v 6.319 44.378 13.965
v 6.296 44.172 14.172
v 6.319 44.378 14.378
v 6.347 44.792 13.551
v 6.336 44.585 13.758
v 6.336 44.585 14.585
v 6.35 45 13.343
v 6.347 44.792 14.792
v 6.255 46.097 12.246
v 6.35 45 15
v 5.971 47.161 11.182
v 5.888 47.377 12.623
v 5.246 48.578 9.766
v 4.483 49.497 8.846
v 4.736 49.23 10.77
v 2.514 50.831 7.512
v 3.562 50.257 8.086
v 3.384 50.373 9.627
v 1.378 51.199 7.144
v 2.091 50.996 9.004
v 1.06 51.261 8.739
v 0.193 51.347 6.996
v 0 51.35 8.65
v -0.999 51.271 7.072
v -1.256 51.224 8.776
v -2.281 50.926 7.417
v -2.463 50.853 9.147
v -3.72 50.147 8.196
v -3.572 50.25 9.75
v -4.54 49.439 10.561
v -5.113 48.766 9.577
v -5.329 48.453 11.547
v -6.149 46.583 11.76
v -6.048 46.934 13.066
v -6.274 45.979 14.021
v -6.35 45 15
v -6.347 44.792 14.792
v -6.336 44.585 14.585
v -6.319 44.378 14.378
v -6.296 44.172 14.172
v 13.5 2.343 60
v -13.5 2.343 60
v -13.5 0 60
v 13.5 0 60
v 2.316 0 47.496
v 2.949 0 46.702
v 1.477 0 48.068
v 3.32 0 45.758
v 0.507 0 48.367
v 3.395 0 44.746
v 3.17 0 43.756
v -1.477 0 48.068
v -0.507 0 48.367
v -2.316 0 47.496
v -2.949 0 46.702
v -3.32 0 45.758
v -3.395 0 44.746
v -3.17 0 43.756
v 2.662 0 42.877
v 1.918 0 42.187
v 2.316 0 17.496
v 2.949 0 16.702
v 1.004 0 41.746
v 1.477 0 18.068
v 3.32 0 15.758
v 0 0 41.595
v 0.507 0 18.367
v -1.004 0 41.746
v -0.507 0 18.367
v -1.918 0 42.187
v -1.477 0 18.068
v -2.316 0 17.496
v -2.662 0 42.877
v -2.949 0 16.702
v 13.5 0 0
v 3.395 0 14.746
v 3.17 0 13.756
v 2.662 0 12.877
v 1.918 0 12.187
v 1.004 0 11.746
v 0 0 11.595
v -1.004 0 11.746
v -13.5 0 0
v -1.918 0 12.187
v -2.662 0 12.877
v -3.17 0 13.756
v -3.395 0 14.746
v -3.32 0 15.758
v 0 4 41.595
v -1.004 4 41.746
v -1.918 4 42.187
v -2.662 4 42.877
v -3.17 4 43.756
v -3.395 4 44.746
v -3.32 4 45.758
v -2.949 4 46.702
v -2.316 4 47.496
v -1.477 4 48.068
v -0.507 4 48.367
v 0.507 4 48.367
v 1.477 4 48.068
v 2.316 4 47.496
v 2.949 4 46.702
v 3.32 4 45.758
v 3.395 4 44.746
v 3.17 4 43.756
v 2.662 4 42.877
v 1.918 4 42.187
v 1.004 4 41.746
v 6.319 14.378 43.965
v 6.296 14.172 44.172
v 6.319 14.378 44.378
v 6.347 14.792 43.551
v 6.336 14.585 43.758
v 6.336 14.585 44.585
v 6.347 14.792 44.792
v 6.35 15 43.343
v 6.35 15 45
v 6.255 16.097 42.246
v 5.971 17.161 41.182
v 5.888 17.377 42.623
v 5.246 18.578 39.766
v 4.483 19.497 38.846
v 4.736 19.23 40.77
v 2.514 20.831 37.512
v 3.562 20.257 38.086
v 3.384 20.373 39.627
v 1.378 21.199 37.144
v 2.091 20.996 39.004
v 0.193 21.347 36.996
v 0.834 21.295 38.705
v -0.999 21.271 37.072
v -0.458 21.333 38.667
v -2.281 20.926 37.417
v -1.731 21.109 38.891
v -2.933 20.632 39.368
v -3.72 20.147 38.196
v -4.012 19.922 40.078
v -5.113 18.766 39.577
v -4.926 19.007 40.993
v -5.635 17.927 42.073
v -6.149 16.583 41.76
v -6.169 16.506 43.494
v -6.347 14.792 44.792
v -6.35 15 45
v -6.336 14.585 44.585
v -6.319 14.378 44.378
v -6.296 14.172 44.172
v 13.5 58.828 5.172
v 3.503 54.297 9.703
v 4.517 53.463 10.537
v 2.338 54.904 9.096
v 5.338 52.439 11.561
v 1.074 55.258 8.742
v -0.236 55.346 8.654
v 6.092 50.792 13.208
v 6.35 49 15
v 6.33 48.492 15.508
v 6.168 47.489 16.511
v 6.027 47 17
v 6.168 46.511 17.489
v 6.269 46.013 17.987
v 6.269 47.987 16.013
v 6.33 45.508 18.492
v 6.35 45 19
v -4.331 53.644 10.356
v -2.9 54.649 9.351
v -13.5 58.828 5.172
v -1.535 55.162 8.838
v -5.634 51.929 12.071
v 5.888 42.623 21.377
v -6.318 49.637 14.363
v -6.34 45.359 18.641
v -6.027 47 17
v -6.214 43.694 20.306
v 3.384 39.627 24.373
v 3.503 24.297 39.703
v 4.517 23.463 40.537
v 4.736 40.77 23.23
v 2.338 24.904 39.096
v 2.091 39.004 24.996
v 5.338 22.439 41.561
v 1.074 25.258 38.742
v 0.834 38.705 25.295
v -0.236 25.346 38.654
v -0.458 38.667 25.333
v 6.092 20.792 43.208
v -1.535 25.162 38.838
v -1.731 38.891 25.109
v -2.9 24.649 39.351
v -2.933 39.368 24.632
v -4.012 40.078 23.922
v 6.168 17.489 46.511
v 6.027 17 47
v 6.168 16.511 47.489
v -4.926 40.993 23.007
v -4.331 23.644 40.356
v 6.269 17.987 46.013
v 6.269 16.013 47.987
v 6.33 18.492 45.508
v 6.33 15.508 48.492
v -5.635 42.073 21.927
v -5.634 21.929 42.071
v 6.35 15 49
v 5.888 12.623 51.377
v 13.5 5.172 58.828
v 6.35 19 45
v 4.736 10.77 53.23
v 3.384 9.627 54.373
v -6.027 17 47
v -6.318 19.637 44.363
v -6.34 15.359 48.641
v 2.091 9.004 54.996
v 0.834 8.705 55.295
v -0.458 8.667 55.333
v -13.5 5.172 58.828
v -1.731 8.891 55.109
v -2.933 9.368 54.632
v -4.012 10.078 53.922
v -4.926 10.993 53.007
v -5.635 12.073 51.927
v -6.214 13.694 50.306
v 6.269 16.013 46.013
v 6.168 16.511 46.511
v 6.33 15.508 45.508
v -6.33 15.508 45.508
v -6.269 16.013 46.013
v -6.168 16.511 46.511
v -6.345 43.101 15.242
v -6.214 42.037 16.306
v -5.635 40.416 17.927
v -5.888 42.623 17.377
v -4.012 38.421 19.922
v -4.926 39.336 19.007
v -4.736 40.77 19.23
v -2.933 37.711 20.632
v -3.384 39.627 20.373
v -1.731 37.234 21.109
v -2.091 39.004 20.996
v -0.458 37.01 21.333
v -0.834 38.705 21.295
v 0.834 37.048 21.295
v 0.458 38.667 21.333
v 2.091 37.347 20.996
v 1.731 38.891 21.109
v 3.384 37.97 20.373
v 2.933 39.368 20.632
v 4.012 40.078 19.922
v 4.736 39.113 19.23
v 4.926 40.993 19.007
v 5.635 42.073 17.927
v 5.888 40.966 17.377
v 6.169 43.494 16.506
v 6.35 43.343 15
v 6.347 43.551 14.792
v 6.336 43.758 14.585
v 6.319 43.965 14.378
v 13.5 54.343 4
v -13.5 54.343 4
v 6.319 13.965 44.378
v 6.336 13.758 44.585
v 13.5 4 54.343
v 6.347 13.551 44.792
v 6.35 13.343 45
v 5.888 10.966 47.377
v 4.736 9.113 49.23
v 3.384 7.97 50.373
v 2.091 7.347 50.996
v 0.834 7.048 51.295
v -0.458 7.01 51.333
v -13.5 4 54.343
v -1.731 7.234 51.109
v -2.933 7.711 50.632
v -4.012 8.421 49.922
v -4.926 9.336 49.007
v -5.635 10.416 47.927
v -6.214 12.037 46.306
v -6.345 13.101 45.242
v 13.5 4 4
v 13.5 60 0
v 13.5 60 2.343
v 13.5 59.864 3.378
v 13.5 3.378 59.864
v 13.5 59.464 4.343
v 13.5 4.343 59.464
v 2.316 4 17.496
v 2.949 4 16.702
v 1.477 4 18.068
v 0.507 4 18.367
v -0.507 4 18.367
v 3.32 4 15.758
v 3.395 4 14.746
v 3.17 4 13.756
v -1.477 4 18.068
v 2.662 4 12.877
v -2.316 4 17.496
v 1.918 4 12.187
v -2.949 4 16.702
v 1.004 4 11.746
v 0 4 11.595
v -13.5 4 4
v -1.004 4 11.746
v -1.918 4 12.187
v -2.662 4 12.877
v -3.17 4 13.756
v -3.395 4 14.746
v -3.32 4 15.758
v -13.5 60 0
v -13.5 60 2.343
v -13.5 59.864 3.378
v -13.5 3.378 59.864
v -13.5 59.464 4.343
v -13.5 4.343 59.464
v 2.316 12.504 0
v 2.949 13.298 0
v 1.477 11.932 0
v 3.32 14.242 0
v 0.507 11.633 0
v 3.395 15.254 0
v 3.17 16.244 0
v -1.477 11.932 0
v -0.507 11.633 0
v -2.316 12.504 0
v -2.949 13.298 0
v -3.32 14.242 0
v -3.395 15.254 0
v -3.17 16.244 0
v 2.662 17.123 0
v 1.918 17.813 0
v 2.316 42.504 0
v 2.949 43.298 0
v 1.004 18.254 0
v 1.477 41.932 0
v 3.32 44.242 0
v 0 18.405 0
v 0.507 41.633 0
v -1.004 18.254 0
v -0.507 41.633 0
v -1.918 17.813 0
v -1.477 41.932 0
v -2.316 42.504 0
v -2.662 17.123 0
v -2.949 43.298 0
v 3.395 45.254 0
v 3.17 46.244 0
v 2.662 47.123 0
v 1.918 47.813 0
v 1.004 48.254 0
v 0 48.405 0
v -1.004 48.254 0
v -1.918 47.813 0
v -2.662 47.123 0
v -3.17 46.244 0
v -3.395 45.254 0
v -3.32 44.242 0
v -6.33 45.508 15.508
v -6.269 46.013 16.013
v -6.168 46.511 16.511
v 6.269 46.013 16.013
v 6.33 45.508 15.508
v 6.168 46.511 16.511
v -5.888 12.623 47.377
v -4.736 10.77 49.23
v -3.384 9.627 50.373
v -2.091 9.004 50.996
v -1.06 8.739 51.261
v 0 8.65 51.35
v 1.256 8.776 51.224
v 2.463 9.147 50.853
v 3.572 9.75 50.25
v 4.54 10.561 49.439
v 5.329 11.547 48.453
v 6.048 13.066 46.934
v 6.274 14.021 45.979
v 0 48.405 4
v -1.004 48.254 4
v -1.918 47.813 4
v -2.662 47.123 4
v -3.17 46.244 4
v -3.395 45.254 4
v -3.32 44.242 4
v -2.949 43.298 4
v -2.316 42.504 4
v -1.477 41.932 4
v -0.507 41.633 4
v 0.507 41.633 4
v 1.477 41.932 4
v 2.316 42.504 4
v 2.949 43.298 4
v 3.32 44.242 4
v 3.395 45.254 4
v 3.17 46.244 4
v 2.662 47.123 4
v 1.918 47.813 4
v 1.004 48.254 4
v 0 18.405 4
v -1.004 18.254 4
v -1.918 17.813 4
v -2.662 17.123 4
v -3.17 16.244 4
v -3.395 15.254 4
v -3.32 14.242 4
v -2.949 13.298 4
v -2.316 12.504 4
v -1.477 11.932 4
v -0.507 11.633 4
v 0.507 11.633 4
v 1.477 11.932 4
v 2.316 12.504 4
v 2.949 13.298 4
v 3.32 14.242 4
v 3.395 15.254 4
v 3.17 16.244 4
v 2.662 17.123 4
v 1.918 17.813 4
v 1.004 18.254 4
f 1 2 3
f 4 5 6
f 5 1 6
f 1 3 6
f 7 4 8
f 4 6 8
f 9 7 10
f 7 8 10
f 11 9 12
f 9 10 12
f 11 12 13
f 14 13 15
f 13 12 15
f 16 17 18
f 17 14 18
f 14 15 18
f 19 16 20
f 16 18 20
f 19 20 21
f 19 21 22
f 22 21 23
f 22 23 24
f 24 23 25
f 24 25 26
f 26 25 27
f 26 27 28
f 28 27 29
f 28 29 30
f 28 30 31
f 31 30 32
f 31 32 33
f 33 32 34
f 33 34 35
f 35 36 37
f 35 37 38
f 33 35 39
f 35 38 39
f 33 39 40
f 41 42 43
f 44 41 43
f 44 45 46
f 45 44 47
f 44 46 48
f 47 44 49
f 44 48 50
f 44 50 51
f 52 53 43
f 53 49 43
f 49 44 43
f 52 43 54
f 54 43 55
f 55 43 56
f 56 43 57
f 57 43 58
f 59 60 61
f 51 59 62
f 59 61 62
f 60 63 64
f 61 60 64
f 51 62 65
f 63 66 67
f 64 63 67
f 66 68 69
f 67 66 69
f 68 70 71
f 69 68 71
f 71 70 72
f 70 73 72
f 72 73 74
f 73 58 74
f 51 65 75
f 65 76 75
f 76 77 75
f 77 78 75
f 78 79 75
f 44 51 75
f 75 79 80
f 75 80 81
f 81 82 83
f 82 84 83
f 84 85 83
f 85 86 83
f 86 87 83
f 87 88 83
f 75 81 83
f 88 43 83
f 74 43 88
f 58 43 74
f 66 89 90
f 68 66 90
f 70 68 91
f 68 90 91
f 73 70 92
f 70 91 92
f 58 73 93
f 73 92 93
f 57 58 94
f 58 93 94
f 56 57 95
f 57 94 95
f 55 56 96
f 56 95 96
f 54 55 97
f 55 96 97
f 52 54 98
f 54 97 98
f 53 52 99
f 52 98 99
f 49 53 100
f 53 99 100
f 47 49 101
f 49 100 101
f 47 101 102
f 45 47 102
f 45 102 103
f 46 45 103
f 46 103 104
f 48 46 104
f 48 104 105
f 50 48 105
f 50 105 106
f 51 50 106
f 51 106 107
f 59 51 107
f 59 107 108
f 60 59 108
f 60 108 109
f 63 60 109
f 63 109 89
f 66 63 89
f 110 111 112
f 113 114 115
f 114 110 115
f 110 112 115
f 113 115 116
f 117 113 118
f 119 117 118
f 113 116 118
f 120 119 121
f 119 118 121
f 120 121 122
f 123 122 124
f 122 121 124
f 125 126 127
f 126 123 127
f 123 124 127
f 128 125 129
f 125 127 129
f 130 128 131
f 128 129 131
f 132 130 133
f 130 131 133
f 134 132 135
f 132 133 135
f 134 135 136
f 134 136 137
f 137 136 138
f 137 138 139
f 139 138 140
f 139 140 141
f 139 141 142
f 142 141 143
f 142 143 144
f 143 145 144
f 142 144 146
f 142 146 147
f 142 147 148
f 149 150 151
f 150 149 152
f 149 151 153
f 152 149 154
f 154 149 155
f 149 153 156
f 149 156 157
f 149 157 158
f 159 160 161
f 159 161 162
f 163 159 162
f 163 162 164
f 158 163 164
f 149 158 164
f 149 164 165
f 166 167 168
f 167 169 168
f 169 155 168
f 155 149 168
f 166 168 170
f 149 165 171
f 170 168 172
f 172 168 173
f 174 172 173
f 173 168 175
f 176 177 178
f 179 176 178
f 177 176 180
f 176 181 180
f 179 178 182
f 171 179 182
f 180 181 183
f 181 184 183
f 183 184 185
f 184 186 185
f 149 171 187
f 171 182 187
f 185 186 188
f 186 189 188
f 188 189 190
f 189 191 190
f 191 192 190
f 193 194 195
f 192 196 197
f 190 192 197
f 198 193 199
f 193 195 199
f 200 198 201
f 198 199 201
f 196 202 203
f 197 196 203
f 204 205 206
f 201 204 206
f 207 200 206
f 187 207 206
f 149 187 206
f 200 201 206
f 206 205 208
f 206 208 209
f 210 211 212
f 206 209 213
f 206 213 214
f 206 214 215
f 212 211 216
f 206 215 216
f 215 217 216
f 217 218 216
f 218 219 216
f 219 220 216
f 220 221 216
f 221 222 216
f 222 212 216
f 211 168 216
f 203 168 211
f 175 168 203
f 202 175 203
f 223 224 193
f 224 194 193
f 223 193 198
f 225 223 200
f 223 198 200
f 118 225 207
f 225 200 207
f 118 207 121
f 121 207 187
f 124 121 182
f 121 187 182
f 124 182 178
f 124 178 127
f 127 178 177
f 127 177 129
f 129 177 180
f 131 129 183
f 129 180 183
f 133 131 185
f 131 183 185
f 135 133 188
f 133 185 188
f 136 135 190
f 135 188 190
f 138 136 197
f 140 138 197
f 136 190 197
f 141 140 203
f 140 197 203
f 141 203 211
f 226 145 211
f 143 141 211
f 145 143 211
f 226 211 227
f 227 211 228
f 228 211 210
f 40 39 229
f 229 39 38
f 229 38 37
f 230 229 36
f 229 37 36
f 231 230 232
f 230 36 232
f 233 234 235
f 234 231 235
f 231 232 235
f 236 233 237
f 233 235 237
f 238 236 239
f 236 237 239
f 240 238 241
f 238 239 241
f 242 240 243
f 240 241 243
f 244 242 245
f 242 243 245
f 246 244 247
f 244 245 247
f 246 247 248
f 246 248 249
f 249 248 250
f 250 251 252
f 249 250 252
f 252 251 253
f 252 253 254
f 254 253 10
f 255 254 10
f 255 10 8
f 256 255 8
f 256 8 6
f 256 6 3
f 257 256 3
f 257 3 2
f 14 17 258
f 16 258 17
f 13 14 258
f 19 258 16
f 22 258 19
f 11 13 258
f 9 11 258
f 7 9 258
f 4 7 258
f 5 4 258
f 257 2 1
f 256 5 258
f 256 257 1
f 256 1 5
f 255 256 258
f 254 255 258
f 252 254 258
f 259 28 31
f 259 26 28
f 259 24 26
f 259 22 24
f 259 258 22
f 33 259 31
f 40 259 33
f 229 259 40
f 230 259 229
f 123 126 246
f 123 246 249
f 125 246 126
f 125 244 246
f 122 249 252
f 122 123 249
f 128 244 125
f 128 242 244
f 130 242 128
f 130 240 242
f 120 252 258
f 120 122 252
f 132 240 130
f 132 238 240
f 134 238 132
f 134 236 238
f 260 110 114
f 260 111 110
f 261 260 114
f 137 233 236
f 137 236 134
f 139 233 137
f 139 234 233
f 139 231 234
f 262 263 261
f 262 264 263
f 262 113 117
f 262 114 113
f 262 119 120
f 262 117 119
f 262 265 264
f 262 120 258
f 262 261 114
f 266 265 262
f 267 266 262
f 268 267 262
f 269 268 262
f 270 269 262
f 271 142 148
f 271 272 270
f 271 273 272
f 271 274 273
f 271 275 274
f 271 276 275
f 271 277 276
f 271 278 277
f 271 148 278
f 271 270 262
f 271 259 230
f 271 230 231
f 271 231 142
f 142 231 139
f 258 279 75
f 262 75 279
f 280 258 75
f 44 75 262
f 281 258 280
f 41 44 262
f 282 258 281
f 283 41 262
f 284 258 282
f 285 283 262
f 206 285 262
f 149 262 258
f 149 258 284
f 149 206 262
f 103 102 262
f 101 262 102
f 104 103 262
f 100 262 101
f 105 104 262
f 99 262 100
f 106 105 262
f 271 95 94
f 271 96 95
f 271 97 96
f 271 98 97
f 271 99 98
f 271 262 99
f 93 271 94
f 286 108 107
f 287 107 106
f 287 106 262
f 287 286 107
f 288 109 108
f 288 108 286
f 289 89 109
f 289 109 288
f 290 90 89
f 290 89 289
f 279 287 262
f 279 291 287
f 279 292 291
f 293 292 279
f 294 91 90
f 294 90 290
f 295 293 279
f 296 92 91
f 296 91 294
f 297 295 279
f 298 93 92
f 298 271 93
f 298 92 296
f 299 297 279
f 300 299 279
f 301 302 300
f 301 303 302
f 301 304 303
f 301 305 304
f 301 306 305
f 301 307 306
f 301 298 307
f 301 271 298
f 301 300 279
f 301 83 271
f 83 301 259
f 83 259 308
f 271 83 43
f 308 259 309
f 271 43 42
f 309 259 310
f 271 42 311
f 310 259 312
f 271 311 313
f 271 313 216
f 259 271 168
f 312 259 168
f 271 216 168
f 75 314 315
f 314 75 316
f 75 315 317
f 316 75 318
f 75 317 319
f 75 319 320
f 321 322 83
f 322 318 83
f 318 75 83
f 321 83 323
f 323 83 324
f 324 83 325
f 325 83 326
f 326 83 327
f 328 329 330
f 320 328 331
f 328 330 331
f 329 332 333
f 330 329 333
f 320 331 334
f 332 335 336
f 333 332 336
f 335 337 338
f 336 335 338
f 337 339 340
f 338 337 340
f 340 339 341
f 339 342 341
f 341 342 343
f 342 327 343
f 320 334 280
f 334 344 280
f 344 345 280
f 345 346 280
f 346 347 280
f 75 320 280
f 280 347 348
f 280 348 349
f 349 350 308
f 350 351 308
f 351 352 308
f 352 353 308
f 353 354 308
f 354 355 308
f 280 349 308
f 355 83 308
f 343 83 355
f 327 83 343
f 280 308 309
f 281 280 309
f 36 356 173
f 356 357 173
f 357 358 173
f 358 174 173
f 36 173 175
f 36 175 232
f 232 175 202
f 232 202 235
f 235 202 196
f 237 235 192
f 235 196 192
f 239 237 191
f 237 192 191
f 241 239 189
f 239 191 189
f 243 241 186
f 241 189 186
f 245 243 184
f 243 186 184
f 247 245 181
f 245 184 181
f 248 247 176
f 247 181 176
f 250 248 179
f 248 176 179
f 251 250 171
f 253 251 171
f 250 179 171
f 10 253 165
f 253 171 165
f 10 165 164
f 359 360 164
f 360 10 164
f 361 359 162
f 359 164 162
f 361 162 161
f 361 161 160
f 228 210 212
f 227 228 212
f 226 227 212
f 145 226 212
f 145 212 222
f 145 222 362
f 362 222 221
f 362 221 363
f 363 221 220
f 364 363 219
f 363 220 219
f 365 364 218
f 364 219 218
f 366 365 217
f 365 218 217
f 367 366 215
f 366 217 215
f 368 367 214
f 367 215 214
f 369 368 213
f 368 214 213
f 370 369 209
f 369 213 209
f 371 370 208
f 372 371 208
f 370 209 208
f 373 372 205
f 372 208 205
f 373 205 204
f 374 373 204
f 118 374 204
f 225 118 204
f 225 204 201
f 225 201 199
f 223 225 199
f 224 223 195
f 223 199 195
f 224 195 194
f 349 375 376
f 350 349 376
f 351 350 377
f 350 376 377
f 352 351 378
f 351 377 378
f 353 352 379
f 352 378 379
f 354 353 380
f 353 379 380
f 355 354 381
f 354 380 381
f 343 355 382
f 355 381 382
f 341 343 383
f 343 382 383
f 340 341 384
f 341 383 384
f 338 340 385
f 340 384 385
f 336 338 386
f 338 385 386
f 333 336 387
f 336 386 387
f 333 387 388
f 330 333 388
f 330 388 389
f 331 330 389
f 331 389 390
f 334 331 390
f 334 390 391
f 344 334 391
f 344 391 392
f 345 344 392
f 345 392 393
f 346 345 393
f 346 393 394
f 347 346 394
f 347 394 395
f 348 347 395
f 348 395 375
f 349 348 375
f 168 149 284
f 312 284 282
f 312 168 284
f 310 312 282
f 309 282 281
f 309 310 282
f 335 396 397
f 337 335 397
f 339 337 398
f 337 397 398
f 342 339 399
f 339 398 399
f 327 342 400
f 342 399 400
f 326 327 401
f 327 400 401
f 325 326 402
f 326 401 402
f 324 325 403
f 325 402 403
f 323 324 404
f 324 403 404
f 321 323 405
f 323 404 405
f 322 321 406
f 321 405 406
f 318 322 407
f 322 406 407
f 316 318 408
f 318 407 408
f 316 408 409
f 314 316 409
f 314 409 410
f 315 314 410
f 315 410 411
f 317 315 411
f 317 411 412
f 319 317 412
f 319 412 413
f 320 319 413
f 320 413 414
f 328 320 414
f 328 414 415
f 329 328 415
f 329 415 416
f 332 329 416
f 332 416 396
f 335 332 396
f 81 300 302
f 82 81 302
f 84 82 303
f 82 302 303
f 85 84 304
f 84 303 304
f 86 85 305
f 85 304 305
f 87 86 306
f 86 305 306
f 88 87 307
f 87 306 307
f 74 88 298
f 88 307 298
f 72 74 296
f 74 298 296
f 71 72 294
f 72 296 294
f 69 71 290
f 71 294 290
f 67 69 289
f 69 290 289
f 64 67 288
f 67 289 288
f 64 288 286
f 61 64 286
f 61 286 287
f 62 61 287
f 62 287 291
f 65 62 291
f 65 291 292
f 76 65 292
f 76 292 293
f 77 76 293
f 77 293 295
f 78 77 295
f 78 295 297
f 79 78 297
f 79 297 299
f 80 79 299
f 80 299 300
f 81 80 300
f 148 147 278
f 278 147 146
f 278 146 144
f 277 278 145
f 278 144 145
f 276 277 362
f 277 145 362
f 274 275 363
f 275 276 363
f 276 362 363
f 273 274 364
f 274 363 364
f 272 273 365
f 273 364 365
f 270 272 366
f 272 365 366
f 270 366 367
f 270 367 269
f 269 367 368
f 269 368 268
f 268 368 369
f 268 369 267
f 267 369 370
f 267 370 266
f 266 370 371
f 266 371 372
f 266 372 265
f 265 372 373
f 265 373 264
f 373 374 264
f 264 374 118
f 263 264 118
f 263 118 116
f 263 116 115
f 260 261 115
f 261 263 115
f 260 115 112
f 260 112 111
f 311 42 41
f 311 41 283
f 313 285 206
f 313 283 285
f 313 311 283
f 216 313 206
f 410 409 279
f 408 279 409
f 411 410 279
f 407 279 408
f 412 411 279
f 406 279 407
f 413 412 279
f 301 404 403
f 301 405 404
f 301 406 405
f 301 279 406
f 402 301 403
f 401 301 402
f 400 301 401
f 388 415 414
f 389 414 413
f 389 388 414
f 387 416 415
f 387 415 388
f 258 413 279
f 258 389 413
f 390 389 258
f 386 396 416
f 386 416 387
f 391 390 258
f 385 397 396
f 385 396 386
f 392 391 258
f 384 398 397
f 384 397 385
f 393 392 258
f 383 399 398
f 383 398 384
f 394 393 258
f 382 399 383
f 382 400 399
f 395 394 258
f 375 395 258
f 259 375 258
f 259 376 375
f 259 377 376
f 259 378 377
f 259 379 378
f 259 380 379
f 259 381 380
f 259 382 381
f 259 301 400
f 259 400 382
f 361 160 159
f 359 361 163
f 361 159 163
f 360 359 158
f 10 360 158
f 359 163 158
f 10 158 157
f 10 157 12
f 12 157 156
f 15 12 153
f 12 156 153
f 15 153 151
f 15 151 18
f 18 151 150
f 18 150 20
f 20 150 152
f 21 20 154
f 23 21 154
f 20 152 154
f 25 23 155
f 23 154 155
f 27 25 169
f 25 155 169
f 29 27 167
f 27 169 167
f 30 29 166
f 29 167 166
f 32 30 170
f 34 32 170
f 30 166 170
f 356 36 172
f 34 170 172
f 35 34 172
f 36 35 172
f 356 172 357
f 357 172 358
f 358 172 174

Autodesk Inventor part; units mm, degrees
ref_plane "YZ Plane" through (0, 0, 0) normal (1, 0, 0) x (0, 1, 0)
ref_plane "XZ Plane" through (0, 0, 0) normal (0, 1, 0) x (-1, 0, 0)
ref_plane "XY Plane" through (0, 0, 0) normal (0, 0, 1) x (1, 0, 0)
sketch "Sketch_1" plane through (0, 0, 0) normal (1, 0, 0) x (0, 1, 0)
  line L0 (2.3431, 60) -> (0, 60)
  line L1 (0, 60) -> (0, 0)
  line L2 (0, 0) -> (60, 0)
  line L3 (60, 0) -> (60, 2.3431)
  arc A0 (60, 2.3431) -> (58.8284, 5.1716) centre (56, 2.3431) ccw
  line L4 (58.8284, 5.1716) -> (5.1716, 58.8284)
  arc A1 (5.1716, 58.8284) -> (2.3431, 60) centre (2.3431, 56) ccw
  line L5 (4, 54.3431) -> (4, 4)
  line L6 (4, 4) -> (54.3431, 4)
  line L7 (54.3431, 4) -> (4, 54.3431)
extrude "Extrusion1" add sketch "Sketch_1" along normal mid plane 27
sketch "Sketch2" plane through (-13.5, 0, 0) normal (0, -1, 0) x (1, 0, 0)
  point P0 (13.5, 15)
hole "Hole1" at (0, 0, 15) direction (0, 1, 0) diameter 6.81 depth 4
sketch "Sketch3" plane through (13.5, 60, 0) normal (0, 0, -1) x (-1, 0, 0)
  point P0 (13.5, -45)
hole "Hole2" at (0, 15, 0) direction (0, 0, 1) diameter 6.81 depth 4
sketch "Sketch_4" plane through (0, 0, 60) normal (0, 0, 1) x (1, 0, 0)
  circle A0 centre (0, 15) radius 6.35
extrude "Extrusion2" cut sketch "Sketch_4" against normal blind 56
sketch "Sketch_5" plane through (0, 60, 0) normal (0, 1, 0) x (1, 0, 0)
  circle A0 centre (0, -15) radius 6.35
extrude "Extrusion3" cut sketch "Sketch_5" against normal blind 56
sketch "Sketch6" plane through (13.5, 60, 0) normal (0, 0, -1) x (-1, 0, 0)
  point P0 (13.5, -15)
hole "Hole3" at (0, 45, 0) direction (0, 0, 1) diameter 6.81 depth 4
sketch "Sketch7" plane through (-13.5, 0, 0) normal (0, -1, 0) x (1, 0, 0)
  point P0 (13.5, 45)
hole "Hole4" at (0, 0, 45) direction (0, 1, 0) diameter 6.81 depth 4
sketch "Sketch_8" plane through (0, 0, 60) normal (0, 0, 1) x (1, 0, 0)
  circle A0 centre (0, 45) radius 6.35
extrude "Extrusion4" cut sketch "Sketch_8" against normal blind 56
sketch "Sketch_9" plane through (0, 60, 0) normal (0, 1, 0) x (1, 0, 0)
  circle A0 centre (0, -45) radius 6.35
extrude "Extrusion5" cut sketch "Sketch_9" against normal blind 56
properties part number "30-4336 Aluminum"
